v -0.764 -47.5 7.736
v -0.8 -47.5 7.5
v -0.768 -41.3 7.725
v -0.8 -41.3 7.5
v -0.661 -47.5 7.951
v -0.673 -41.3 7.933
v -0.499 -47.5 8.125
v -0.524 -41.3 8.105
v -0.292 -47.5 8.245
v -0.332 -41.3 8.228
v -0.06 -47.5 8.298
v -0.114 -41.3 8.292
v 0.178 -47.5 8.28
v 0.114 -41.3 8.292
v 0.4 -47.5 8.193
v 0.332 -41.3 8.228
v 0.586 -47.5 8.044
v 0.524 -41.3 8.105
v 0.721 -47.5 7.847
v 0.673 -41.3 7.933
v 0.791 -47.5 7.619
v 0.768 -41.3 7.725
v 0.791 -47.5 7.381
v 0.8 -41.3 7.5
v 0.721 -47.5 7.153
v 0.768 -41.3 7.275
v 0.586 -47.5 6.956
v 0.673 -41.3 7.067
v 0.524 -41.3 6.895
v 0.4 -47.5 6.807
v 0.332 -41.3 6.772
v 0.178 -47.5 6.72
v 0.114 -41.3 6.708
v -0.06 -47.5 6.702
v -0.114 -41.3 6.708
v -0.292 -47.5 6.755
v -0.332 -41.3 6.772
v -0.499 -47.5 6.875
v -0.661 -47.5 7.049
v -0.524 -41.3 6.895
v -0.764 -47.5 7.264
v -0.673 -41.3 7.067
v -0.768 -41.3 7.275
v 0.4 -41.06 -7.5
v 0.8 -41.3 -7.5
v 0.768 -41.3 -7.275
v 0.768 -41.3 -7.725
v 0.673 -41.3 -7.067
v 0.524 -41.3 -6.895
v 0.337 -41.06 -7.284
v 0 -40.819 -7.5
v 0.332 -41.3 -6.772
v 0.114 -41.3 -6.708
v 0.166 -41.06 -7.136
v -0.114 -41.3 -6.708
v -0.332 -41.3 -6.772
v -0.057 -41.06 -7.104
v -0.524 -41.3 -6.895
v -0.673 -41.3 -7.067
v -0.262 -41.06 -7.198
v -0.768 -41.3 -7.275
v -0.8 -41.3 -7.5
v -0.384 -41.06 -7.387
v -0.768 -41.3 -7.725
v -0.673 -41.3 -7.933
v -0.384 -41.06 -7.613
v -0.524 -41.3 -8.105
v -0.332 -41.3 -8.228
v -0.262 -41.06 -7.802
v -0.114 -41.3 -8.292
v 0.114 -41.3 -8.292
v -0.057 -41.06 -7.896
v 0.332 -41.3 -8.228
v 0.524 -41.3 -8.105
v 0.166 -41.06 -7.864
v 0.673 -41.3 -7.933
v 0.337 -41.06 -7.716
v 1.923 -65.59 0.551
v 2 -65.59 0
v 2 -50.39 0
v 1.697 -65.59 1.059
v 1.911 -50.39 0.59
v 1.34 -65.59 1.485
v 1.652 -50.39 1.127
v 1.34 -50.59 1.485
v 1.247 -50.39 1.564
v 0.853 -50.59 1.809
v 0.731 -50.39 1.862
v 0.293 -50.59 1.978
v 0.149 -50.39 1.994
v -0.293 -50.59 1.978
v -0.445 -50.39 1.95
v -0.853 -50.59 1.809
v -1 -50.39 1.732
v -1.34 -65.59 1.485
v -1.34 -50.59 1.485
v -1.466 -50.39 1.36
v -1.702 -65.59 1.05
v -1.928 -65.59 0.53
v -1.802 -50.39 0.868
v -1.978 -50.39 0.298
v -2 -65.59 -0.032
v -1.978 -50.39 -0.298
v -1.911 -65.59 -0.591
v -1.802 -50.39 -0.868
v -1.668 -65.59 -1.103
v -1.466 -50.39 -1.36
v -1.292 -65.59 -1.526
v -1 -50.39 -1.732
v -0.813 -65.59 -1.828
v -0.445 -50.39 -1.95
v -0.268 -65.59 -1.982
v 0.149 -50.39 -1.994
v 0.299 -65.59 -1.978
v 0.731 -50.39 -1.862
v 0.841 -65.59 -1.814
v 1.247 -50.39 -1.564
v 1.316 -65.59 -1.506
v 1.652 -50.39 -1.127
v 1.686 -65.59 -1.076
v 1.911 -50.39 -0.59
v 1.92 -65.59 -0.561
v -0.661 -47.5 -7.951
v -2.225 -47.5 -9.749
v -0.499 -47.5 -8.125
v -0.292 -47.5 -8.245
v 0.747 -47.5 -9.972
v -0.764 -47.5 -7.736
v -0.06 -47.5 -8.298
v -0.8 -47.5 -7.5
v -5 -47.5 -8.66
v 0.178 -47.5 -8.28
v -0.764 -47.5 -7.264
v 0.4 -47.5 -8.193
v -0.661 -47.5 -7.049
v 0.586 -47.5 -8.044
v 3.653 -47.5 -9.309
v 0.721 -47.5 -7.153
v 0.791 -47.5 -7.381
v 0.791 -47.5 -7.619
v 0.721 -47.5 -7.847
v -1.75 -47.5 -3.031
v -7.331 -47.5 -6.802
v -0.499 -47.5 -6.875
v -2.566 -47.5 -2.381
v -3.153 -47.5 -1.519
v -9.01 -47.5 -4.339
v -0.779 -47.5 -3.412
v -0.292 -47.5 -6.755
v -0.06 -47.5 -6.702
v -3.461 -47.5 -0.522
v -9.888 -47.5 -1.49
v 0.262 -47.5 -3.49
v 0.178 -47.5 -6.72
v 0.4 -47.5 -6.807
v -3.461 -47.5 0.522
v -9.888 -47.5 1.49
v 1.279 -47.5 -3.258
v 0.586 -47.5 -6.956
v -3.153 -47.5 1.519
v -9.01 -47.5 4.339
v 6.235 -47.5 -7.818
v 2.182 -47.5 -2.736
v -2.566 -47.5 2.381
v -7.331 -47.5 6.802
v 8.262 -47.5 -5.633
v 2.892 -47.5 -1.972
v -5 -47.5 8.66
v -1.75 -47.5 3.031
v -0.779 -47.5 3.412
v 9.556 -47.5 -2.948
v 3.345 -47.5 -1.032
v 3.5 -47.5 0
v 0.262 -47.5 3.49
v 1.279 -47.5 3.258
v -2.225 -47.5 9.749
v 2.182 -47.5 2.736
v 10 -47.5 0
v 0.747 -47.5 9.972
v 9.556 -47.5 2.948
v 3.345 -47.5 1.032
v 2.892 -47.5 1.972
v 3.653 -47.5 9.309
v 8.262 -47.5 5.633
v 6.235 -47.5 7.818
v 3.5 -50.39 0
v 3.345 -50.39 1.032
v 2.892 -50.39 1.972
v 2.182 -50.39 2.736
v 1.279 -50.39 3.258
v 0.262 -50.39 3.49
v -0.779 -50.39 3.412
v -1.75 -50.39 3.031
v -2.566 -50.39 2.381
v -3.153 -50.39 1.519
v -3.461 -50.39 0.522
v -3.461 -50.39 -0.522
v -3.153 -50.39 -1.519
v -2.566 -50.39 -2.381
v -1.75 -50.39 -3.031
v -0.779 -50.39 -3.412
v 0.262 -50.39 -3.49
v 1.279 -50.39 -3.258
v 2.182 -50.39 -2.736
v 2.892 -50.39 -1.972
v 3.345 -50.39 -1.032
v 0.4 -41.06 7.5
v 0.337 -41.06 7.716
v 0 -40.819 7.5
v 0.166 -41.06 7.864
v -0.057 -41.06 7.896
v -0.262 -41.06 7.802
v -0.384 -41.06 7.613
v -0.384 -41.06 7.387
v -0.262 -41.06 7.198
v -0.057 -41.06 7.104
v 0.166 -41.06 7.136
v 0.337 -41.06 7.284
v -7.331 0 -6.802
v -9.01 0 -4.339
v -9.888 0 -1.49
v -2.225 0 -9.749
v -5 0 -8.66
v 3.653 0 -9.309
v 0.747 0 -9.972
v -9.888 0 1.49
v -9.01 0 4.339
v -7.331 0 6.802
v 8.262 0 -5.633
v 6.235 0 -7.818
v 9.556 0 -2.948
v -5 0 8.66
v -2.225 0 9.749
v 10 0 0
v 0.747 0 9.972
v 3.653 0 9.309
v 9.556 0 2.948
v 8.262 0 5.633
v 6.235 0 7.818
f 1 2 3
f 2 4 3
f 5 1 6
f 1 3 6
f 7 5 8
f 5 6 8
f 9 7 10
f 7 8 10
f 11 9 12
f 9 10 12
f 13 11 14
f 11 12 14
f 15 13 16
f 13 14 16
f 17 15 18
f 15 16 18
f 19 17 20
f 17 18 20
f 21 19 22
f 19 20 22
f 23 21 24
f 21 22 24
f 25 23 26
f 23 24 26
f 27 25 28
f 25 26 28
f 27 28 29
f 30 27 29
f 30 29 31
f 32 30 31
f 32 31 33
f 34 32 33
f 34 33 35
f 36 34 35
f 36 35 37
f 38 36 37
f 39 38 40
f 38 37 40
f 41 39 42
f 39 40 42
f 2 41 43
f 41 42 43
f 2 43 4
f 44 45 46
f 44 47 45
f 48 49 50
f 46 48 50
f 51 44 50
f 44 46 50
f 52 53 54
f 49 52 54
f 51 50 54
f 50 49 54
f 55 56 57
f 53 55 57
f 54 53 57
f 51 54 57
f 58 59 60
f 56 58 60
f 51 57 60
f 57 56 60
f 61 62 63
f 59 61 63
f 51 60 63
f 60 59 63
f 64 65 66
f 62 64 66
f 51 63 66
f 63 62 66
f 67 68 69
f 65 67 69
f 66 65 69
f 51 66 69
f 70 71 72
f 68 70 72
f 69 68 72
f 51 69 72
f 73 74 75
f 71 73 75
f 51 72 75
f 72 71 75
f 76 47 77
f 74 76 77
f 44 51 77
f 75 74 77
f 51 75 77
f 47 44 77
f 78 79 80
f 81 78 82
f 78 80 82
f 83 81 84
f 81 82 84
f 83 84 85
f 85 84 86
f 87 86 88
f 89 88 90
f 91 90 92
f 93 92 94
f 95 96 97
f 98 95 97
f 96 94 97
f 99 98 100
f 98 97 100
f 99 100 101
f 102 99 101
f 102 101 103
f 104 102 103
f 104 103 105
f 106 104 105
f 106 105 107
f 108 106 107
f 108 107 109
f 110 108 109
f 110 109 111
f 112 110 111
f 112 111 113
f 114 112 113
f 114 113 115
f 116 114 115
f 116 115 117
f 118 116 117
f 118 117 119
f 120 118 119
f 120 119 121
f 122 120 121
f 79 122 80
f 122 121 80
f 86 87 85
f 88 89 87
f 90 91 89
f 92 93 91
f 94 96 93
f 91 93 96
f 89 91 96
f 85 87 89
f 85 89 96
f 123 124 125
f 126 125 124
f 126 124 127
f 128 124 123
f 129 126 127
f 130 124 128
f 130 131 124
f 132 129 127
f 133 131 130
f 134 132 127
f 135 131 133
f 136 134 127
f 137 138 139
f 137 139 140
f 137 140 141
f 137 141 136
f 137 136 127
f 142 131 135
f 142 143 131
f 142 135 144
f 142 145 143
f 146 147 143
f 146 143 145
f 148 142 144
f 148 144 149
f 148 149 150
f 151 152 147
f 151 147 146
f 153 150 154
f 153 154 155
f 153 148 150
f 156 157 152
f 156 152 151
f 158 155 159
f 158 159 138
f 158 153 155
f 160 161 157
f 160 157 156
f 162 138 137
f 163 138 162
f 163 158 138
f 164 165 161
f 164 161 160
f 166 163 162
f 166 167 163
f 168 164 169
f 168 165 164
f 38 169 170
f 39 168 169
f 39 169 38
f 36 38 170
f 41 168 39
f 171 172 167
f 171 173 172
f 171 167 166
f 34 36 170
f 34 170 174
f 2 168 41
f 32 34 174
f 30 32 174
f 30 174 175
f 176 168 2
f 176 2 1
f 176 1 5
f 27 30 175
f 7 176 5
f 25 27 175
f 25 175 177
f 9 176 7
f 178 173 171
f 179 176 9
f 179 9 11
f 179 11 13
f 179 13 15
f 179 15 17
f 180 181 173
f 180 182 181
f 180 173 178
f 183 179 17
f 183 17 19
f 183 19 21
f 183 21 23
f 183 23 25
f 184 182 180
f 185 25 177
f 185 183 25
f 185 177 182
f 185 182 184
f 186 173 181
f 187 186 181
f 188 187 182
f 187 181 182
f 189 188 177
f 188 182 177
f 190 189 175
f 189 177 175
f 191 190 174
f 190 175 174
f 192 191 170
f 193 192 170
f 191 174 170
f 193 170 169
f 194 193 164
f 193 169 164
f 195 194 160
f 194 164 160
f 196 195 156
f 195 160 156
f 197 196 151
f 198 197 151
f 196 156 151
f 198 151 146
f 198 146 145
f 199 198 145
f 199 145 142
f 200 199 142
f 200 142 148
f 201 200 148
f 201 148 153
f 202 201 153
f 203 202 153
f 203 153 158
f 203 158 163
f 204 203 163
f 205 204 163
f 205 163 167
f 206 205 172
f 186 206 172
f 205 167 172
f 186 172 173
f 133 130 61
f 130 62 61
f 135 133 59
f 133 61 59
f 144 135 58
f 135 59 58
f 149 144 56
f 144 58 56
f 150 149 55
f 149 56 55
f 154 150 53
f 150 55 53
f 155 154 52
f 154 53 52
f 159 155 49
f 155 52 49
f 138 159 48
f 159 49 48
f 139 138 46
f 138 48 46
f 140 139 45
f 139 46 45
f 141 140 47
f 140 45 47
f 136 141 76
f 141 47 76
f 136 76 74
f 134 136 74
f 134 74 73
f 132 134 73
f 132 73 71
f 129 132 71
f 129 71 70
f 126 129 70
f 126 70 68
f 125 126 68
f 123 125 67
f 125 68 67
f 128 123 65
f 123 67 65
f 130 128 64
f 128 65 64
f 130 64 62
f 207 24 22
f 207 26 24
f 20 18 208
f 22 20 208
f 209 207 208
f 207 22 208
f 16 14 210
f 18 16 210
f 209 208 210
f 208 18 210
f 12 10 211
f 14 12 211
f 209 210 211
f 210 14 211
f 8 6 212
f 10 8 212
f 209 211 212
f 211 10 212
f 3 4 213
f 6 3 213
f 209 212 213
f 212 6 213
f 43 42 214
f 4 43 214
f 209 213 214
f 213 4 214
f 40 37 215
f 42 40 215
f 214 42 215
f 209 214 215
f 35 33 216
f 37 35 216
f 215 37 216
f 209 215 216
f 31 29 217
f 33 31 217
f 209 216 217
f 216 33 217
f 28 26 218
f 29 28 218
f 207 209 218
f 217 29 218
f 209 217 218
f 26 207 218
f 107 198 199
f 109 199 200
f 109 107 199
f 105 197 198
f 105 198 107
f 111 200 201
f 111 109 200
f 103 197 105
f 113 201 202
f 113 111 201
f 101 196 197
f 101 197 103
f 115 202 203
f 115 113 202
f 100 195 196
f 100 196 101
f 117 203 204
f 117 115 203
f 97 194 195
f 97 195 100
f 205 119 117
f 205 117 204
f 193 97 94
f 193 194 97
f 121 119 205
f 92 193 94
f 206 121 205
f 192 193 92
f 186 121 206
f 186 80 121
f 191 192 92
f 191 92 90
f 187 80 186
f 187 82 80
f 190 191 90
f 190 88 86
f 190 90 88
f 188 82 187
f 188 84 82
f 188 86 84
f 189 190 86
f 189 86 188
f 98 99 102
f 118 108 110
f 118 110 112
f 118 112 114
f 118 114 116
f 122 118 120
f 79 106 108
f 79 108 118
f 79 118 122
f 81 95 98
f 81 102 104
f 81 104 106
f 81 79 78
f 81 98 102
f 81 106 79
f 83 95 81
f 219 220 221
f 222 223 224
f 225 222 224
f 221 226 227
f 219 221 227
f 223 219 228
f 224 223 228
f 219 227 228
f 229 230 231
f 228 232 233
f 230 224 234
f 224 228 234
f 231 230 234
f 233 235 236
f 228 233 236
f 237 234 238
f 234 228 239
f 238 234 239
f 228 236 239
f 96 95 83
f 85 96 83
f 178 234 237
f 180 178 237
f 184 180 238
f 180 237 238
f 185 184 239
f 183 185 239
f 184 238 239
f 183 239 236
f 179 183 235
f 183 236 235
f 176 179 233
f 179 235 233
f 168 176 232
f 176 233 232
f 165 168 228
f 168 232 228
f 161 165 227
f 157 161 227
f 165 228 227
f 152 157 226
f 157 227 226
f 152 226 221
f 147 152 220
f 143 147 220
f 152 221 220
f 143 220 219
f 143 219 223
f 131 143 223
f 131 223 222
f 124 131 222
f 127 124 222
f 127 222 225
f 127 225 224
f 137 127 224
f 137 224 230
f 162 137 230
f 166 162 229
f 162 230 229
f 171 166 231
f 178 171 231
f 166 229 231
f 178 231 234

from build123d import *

# Parameters (mm, degrees)
F0_R     = 10
F1_DEPTH = 47.5
F2_R     = 3.5
F3_DEPTH = 2.89
F4_R     = 2
F5_DEPTH = 15.2
F7_D     = 1.6
F7_DEPTH = 6.2
F7_TIP   = 0.4806884952
F9_DEPTH = 15


with BuildPart() as f1:
    # F0 (on Front) → F1 (new body)
    with BuildSketch(Plane.XZ):
        Circle(F0_R)
    extrude(amount=F1_DEPTH)

    # F2 (on face) → F3 (join)
    with BuildSketch(Plane.XZ.offset(47.5)):
        Circle(F2_R)
    extrude(amount=F3_DEPTH)

    # F4 (on face) → F5 (join)
    with BuildSketch(Plane.XZ.offset(50.39)):
        Circle(F4_R)
    extrude(amount=F5_DEPTH)

    # F7
    with Locations(Plane.XZ.offset(47.5)):
        with Locations((0, 7.5), (0, -7.5)):
            Hole(F7_D / 2, depth=F7_DEPTH)
            with Locations((0, 0, -(F7_DEPTH + F7_TIP / 2))):  # 118° drill point
                Cone(0, F7_D / 2, F7_TIP, mode=Mode.SUBTRACT)

    # F8 (on face) → F9 (cut)
    with BuildSketch(Plane.XZ.offset(65.59)):
        with BuildLine():
            ThreePointArc((1.339812841, 1.4848910907), (0, 2), (-1.339812841, 1.4848910907))
            Line((-1.339812841, 1.4848910907), (1.339812841, 1.4848910907))
        make_face()
    extrude(amount=-F9_DEPTH, mode=Mode.SUBTRACT)


solid = f1.part
